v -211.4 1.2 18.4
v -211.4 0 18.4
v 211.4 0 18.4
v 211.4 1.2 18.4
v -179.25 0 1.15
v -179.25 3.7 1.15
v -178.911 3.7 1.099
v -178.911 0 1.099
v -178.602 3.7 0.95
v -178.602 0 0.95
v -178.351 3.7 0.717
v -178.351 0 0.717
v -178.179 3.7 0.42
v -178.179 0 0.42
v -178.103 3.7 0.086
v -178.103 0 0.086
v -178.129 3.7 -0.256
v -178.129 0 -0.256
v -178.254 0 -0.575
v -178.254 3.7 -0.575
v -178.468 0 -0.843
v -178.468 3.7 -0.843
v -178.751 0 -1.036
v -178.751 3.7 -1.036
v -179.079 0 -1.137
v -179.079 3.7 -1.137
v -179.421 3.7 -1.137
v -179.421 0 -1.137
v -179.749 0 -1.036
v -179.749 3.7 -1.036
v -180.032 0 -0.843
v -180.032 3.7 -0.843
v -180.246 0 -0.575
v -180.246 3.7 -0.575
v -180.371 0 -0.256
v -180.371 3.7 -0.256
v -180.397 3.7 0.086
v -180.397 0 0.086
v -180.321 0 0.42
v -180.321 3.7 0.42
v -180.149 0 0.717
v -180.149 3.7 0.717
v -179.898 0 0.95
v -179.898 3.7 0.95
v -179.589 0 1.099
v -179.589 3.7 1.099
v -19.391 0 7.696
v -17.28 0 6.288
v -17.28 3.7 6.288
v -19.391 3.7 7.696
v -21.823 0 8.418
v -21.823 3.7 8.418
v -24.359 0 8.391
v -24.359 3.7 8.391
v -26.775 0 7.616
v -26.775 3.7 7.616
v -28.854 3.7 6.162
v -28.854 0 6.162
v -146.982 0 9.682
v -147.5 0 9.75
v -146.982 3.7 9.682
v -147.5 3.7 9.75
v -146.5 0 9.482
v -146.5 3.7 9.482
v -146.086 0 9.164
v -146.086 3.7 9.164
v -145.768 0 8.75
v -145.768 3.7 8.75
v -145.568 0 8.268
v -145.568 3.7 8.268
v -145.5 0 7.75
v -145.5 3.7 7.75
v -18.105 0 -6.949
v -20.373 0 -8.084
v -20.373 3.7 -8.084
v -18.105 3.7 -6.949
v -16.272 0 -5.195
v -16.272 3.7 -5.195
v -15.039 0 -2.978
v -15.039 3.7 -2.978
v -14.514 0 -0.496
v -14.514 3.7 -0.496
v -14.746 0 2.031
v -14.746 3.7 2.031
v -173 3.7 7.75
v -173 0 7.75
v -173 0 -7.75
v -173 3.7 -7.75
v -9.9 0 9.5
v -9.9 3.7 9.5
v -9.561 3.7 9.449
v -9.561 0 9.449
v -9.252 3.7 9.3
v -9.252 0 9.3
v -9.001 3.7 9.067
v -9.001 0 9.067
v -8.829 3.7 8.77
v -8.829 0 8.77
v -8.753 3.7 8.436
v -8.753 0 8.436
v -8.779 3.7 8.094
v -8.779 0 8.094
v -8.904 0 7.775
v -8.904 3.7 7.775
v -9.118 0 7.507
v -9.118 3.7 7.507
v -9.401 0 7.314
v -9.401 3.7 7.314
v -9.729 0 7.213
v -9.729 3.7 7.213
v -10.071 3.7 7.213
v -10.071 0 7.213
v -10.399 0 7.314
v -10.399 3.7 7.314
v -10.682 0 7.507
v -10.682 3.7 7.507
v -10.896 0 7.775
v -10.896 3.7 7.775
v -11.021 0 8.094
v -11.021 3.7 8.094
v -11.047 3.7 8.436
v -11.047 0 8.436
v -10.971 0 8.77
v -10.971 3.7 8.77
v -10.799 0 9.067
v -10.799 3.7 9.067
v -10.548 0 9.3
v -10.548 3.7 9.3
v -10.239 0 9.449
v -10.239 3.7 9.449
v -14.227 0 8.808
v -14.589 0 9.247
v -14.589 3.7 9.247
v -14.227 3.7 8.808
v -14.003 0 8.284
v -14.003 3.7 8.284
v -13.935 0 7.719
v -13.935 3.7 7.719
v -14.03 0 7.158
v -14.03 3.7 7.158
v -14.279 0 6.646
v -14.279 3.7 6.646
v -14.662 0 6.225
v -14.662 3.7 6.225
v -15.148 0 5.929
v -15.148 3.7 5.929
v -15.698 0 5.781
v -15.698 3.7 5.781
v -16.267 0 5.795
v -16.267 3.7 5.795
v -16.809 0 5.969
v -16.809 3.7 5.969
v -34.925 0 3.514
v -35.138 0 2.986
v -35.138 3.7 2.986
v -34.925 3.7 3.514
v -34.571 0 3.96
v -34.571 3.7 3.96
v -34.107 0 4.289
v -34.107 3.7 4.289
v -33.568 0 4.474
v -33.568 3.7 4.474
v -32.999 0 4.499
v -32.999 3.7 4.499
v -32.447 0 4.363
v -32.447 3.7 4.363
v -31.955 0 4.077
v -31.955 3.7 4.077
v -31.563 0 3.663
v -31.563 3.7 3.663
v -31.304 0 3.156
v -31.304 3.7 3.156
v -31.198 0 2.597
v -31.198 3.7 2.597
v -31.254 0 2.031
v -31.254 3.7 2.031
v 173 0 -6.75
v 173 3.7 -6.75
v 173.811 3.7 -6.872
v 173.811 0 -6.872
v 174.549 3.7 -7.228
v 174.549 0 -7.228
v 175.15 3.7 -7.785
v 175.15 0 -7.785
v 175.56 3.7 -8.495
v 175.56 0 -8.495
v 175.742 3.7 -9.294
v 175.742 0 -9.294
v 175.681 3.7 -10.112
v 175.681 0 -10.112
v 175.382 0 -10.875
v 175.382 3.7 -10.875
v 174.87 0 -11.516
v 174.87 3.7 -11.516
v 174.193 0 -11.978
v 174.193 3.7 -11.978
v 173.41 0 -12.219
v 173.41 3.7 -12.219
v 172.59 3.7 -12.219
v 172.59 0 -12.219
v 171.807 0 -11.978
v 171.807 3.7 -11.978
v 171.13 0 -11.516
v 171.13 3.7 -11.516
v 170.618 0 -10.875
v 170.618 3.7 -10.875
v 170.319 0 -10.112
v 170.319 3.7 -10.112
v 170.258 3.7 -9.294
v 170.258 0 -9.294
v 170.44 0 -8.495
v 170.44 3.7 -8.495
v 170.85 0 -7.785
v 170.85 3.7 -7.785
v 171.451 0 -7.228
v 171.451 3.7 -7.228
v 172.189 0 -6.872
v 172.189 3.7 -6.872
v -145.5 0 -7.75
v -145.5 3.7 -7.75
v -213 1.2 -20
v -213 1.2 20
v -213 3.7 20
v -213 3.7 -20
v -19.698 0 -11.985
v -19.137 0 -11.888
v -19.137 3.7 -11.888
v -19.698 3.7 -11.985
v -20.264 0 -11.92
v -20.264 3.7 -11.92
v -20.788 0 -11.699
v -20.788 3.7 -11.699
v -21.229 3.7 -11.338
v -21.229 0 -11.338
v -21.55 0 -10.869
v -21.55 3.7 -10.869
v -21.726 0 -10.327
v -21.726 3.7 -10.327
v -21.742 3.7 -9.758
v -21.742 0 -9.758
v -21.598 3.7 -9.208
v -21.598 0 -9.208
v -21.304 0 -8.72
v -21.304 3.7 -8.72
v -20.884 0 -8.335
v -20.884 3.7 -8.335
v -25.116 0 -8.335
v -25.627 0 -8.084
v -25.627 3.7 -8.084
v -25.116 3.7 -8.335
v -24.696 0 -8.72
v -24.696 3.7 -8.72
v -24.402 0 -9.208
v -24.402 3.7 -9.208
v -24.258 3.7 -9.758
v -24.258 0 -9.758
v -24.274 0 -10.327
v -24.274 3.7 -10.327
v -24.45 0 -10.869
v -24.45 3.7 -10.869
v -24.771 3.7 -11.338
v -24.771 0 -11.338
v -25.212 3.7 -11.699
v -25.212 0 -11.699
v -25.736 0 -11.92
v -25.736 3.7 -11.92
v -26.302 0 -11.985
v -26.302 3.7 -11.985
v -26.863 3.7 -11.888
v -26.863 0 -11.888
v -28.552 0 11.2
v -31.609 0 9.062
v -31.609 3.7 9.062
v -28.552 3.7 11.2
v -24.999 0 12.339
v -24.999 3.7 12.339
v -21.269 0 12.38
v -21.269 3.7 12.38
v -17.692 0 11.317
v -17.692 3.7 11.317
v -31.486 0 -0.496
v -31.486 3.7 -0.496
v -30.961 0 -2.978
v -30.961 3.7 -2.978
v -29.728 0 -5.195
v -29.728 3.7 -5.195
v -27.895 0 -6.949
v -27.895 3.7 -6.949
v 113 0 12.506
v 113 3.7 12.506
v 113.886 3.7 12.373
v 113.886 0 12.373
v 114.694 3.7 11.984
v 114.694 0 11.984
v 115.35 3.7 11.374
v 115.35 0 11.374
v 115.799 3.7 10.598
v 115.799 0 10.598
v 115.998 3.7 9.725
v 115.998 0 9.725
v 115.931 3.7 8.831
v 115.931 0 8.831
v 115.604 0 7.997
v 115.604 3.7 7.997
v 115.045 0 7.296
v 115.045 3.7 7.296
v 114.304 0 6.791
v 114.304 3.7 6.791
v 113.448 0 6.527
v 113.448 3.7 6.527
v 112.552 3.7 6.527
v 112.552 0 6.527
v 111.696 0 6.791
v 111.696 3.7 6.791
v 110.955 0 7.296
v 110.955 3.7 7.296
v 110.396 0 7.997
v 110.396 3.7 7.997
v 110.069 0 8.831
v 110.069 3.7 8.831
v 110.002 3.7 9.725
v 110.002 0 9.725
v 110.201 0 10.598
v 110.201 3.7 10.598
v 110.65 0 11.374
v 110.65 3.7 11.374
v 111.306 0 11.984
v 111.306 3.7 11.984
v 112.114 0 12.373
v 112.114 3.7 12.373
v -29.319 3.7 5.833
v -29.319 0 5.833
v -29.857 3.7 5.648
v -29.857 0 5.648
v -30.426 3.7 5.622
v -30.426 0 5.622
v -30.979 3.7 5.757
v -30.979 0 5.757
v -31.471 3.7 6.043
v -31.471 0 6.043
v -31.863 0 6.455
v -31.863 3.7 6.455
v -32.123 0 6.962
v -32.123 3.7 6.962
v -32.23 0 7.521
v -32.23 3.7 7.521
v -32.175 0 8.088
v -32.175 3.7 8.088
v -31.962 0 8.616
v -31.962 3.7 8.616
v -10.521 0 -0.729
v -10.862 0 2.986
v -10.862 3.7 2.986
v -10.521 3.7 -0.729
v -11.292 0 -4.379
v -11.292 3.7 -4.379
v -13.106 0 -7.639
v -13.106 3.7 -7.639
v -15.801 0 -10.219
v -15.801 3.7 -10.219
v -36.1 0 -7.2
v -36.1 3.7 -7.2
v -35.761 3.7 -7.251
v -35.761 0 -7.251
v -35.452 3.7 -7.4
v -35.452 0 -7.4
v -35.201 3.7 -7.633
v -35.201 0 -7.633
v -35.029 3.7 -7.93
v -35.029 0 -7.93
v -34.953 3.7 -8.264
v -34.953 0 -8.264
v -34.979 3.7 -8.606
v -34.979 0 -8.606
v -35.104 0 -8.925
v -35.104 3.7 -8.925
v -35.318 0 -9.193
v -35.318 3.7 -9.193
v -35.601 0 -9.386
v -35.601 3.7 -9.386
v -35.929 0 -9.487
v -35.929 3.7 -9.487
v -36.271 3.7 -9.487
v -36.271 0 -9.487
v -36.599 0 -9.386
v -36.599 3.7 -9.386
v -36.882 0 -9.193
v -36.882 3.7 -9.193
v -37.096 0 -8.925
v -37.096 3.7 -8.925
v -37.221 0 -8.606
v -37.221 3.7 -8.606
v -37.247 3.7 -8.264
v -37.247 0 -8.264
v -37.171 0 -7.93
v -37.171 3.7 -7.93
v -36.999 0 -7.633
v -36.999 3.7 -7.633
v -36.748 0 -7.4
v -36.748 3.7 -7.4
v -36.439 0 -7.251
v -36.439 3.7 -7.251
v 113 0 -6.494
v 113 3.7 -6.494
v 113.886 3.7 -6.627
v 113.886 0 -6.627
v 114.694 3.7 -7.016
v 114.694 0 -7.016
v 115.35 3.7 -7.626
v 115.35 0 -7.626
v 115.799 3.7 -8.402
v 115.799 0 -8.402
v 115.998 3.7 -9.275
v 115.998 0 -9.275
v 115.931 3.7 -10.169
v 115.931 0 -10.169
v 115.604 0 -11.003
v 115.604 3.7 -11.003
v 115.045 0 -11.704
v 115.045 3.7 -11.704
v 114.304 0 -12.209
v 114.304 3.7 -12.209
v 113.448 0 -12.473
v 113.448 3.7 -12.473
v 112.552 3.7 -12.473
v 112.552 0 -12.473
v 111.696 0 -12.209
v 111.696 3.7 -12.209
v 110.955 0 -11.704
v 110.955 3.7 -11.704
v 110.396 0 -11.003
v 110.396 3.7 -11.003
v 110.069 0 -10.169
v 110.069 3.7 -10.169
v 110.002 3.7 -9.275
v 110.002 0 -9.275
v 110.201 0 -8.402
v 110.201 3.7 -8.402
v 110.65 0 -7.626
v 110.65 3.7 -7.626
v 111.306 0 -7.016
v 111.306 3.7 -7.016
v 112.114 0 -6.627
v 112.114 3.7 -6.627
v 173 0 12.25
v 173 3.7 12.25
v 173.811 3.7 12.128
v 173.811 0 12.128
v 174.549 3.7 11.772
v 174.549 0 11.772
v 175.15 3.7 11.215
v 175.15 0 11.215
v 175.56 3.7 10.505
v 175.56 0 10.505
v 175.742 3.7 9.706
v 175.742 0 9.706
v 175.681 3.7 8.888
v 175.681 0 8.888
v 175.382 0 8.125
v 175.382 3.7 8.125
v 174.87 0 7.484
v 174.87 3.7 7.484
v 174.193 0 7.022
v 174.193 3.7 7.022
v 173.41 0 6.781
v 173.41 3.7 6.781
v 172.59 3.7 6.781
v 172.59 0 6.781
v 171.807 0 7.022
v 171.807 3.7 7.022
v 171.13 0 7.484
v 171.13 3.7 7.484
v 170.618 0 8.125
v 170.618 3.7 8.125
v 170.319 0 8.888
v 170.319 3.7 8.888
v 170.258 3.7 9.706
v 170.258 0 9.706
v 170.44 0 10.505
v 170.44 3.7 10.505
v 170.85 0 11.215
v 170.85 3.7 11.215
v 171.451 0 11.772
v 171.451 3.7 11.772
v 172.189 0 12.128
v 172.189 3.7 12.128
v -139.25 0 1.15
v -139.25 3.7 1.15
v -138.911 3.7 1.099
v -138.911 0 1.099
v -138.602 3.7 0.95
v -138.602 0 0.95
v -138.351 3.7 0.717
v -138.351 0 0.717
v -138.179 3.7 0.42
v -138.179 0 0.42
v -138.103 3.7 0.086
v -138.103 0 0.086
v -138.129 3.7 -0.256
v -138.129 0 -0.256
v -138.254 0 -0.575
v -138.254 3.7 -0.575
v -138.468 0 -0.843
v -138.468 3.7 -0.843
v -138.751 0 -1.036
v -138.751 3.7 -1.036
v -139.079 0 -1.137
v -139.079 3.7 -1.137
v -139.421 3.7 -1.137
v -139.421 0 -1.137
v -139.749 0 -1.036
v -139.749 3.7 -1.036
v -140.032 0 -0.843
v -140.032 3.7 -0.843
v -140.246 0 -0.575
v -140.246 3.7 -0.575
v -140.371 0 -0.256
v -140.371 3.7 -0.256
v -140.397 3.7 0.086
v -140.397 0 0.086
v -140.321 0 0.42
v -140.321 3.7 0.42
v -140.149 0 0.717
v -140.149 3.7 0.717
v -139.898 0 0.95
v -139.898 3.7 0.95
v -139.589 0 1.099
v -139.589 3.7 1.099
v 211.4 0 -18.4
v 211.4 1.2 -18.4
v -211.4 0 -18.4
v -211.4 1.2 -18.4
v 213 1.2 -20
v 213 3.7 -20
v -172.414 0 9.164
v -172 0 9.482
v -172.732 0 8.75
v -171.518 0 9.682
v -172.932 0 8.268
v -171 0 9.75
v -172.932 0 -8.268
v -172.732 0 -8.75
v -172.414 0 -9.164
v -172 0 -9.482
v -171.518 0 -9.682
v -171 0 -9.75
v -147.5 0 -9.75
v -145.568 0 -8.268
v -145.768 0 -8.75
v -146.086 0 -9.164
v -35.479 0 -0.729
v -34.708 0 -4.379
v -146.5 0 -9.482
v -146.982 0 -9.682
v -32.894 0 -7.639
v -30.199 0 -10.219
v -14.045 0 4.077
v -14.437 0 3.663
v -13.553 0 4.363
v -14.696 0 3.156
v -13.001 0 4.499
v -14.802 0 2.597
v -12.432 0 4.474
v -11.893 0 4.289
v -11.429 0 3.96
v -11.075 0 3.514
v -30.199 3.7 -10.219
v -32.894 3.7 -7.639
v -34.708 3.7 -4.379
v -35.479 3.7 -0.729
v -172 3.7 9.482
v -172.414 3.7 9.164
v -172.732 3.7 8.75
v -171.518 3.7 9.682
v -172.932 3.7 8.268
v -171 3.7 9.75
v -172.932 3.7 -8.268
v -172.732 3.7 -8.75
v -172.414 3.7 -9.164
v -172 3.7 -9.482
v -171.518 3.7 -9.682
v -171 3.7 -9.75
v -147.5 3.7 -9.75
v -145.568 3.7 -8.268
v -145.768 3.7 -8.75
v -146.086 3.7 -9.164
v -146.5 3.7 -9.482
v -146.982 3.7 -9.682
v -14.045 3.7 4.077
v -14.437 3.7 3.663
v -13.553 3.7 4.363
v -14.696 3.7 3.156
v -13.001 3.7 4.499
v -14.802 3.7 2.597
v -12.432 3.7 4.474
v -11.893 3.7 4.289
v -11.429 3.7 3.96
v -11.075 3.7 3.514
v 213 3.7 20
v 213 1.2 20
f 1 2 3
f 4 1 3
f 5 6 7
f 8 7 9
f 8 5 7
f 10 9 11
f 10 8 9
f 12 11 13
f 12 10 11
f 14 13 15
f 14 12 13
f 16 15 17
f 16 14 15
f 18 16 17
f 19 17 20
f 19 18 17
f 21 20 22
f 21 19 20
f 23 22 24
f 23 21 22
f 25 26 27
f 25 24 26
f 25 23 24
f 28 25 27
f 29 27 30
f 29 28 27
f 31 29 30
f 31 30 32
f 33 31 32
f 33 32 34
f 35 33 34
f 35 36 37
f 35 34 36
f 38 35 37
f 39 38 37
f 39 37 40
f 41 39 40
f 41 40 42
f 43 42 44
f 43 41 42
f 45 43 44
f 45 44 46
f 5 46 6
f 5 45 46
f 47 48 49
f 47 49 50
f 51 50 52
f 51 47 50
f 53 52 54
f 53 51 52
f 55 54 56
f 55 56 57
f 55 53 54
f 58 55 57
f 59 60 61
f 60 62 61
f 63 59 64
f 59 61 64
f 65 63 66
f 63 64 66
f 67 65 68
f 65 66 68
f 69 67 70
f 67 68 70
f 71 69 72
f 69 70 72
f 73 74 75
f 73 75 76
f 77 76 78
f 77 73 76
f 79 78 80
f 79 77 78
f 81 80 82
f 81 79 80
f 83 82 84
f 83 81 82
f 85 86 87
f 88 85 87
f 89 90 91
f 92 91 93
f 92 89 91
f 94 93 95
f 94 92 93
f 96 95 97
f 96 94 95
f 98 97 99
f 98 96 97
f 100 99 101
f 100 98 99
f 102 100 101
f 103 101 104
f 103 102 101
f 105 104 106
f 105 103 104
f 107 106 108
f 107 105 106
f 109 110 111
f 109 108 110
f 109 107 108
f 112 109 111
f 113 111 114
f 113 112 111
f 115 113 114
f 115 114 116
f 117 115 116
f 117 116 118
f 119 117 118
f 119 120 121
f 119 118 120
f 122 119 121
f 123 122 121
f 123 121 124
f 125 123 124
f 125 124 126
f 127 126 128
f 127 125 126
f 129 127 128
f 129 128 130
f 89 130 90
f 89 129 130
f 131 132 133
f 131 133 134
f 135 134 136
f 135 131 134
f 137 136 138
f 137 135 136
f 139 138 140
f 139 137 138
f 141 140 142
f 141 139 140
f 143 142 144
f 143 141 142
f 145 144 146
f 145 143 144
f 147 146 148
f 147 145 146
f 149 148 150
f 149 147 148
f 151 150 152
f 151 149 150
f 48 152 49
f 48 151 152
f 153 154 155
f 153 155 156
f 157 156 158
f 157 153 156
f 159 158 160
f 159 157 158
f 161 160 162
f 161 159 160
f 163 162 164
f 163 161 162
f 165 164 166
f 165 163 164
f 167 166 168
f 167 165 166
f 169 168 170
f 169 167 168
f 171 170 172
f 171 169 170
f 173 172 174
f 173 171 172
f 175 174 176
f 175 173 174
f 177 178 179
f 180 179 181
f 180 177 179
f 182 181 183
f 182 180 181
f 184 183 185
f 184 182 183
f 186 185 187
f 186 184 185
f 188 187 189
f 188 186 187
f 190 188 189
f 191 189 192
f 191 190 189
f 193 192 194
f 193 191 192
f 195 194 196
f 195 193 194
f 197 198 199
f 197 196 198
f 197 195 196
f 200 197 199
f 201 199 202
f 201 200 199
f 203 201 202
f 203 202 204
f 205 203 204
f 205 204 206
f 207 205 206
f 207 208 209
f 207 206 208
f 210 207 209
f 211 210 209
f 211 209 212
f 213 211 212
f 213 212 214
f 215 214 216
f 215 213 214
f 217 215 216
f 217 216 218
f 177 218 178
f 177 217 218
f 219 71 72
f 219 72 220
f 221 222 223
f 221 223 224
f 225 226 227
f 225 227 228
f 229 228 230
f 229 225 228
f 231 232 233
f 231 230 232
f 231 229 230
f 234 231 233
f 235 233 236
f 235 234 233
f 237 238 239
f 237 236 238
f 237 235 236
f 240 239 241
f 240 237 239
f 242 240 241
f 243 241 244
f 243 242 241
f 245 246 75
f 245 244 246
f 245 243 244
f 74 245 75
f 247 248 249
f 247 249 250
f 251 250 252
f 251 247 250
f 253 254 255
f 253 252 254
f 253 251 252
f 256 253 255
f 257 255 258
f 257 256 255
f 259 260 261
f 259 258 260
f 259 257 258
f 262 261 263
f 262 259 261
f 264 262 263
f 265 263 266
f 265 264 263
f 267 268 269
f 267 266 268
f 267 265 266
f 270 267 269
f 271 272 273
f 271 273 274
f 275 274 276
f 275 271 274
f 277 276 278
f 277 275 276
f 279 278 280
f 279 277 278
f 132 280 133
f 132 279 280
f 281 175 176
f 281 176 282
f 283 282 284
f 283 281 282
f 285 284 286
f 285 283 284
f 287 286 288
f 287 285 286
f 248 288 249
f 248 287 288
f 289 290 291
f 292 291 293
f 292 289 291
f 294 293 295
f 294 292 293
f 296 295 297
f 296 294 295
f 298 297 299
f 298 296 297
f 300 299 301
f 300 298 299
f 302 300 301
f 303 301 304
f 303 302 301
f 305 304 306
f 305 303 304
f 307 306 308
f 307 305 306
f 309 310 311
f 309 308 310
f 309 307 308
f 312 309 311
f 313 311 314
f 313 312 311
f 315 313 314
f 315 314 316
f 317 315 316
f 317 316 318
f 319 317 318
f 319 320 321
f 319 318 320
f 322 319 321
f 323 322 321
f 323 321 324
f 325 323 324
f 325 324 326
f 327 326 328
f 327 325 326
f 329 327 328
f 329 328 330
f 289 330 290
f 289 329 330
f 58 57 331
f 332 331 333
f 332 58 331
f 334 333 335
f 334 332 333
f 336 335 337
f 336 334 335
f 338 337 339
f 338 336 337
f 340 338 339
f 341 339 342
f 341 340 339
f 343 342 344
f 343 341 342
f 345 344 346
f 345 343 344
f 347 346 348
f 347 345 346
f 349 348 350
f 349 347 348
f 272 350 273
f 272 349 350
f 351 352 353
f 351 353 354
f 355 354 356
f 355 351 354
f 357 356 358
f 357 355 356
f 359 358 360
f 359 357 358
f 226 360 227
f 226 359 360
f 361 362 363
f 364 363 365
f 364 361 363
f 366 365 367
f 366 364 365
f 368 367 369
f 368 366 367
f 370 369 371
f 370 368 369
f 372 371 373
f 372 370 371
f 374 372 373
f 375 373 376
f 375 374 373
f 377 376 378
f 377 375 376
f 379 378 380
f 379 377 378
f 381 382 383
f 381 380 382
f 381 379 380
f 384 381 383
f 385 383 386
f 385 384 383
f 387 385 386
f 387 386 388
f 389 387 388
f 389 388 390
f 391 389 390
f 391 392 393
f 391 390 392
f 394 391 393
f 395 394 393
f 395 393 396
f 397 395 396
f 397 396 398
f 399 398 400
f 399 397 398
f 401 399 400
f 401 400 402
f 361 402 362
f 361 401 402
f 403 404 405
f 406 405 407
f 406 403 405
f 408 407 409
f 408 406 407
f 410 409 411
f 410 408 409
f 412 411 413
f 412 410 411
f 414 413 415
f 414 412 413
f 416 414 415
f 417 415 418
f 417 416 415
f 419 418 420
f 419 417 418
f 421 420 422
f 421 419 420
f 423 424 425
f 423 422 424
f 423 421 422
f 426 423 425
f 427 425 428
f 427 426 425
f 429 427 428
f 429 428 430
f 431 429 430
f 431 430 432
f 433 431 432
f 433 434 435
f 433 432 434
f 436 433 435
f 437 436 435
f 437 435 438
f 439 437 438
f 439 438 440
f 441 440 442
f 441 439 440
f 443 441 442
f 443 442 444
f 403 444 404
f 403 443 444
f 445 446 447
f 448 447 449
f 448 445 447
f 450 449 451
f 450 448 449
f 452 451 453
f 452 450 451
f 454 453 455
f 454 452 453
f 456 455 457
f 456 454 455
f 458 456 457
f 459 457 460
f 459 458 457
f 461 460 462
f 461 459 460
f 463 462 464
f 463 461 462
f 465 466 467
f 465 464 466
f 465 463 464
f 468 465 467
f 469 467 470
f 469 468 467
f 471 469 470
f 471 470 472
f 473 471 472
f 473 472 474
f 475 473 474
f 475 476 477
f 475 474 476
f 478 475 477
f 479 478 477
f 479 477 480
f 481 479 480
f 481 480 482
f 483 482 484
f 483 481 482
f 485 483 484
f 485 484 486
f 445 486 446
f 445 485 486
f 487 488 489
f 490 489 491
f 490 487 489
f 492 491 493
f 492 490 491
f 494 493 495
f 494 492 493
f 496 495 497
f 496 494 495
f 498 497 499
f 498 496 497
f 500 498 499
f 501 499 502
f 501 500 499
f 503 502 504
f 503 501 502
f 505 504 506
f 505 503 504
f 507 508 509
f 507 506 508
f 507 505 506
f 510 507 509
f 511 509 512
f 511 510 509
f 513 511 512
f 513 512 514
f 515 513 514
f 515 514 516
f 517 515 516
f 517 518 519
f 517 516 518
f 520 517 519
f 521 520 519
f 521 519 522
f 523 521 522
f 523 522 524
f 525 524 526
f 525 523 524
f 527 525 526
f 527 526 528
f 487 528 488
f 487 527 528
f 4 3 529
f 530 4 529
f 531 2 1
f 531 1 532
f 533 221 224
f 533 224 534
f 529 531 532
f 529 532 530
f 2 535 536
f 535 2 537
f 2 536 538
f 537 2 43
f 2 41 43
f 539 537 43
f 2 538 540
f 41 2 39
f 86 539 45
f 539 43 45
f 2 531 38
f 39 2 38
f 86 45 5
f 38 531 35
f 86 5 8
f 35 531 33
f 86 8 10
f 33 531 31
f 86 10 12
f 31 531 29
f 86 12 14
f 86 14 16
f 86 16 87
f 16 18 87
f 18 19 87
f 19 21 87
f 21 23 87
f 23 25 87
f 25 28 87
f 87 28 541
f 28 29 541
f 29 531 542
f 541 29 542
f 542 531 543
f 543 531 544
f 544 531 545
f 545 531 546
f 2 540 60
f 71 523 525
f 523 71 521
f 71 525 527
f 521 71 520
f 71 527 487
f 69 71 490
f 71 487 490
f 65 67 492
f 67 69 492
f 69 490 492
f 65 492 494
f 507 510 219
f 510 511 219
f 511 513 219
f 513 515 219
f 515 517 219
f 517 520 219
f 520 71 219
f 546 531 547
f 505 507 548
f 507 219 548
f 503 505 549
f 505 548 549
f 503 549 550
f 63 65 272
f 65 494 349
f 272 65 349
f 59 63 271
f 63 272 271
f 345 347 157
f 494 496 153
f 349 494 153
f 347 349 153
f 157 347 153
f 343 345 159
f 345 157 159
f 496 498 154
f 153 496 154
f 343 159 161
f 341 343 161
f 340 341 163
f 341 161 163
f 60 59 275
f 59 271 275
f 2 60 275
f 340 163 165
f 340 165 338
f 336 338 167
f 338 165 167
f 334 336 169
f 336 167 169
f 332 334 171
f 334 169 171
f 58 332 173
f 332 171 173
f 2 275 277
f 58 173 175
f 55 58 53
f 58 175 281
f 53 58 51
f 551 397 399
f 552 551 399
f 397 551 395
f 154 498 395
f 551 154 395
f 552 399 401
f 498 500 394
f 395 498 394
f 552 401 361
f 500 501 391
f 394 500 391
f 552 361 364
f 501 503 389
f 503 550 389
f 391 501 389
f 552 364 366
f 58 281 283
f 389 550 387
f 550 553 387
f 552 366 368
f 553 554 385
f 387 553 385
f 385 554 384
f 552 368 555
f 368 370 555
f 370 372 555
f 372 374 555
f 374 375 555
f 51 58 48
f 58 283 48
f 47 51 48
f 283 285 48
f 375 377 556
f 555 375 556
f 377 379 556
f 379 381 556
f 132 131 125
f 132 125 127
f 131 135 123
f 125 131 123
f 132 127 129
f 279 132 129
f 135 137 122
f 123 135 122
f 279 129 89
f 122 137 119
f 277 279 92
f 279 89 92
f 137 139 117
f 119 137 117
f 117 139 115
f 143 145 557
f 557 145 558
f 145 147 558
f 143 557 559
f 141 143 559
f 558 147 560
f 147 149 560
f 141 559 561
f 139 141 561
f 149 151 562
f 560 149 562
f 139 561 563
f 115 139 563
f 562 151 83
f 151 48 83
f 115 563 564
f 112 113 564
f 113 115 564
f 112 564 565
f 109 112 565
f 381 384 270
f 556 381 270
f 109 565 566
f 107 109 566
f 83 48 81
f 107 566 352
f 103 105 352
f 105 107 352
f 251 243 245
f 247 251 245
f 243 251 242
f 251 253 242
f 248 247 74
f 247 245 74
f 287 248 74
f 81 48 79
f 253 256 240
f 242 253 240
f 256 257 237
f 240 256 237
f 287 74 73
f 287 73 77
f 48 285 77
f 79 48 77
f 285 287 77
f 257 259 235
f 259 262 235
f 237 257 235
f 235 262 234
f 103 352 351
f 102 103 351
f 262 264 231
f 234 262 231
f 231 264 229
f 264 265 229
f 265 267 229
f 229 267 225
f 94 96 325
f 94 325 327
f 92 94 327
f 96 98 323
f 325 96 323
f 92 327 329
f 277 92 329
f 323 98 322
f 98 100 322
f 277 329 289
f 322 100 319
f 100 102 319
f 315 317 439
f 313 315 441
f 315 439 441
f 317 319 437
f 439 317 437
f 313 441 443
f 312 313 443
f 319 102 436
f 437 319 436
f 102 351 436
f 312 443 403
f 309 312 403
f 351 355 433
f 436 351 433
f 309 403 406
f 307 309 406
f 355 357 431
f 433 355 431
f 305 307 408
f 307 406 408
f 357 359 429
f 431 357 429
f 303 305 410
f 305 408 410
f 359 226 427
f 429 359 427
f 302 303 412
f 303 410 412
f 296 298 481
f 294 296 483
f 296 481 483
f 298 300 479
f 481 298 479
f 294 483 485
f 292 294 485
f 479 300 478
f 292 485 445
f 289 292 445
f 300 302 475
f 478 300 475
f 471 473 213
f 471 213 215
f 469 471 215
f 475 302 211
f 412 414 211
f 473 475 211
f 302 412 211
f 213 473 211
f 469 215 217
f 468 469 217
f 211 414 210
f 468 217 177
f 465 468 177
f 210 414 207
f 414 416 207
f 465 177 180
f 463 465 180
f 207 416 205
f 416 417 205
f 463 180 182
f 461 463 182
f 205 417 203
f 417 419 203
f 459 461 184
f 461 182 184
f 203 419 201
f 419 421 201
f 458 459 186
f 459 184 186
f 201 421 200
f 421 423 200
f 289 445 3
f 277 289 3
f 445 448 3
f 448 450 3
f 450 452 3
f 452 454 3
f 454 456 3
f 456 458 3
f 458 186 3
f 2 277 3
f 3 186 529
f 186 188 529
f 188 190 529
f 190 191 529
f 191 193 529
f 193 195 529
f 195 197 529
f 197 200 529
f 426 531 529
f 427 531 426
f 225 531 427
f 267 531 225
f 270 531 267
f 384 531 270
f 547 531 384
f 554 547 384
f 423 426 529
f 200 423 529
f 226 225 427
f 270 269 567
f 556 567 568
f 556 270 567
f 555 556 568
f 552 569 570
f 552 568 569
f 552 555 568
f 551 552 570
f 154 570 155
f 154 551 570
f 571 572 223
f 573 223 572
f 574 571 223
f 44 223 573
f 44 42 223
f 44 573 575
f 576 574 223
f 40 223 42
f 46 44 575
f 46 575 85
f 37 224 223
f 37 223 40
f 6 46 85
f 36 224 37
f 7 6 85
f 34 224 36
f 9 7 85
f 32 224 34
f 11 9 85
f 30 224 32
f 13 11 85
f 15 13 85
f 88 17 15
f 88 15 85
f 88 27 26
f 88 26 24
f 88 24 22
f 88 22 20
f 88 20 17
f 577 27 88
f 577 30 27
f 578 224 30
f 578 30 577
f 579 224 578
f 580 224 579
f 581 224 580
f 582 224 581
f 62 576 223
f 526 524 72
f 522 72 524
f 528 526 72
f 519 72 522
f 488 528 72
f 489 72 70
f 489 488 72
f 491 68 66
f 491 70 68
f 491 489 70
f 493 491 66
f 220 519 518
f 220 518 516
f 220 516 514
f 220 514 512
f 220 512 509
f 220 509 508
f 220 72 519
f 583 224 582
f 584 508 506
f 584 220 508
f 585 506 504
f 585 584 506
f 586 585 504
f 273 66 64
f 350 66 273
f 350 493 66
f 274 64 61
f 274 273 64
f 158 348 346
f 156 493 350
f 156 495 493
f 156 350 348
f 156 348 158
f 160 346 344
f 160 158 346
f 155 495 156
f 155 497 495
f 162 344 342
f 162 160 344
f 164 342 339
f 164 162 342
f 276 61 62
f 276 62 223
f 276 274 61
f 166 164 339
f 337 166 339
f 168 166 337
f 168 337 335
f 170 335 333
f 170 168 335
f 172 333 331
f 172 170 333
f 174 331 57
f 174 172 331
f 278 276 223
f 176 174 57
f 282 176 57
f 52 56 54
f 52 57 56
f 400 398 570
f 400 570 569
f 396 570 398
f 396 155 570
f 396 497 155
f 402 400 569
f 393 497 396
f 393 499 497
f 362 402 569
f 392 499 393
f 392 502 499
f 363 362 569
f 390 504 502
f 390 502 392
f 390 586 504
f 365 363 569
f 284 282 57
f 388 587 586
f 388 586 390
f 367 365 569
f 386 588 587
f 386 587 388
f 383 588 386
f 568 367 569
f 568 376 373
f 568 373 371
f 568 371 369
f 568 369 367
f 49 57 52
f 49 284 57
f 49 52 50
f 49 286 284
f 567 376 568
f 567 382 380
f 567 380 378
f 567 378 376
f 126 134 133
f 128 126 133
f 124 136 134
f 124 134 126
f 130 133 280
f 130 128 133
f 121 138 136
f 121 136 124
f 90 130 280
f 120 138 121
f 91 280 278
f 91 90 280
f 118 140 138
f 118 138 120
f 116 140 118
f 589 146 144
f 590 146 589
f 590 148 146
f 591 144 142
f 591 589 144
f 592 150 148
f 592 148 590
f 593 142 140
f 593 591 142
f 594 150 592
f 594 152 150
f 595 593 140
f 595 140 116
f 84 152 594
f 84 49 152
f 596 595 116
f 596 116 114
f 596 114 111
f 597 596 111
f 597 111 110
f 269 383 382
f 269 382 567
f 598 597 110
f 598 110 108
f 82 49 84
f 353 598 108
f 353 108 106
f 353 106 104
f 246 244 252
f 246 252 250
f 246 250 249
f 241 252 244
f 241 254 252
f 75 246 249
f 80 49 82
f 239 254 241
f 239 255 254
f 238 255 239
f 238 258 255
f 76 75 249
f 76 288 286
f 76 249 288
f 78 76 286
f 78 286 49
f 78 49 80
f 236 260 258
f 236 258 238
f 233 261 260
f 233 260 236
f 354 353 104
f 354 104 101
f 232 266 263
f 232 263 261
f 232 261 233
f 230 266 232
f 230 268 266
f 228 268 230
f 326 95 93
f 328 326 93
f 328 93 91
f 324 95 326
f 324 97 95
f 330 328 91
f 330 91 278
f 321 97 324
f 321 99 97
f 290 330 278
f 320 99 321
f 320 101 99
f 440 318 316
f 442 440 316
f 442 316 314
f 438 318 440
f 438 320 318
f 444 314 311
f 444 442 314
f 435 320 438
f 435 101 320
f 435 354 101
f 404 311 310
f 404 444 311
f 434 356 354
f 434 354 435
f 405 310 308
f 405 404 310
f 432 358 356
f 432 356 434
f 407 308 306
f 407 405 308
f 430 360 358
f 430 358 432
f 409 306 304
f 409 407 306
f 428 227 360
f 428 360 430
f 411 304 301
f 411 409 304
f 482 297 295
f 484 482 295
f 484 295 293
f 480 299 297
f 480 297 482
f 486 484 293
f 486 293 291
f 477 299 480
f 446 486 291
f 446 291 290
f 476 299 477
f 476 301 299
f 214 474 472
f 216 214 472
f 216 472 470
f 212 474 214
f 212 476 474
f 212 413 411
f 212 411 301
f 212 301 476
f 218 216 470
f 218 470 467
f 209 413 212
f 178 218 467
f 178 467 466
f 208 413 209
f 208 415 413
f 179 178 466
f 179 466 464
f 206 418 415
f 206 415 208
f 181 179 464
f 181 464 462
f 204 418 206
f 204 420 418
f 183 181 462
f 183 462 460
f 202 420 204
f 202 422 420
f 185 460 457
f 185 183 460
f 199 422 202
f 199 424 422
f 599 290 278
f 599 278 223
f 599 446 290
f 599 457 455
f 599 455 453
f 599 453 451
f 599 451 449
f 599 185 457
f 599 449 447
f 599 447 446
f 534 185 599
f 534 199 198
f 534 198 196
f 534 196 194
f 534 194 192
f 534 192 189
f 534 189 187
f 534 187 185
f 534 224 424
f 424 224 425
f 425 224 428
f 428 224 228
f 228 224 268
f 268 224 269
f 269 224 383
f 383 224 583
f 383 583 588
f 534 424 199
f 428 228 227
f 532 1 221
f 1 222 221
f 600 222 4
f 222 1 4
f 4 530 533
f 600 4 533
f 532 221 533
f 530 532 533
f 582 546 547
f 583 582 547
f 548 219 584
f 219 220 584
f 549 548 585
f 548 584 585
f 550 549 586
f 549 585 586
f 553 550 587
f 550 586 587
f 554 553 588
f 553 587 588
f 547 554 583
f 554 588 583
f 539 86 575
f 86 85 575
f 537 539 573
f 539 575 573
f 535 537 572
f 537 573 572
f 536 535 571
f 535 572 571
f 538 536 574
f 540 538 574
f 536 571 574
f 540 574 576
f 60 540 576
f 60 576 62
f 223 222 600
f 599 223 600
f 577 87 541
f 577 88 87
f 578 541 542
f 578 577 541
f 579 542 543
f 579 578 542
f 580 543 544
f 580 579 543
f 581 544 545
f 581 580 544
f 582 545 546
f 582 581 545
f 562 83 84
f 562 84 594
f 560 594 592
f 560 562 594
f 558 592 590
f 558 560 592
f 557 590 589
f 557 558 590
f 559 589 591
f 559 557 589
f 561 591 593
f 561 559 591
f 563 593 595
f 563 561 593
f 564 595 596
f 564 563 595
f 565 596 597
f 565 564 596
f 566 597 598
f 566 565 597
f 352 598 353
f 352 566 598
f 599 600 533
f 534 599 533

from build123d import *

# Parameters (mm, degrees)
SKETCH_1_W            = 426
SKETCH_1_H            = 40
EXTRUDE_1_DEPTH       = 3.7
SKETCH_1_2_W          = 426
SKETCH_1_2_H          = 40
SKETCH_1_2_W_2        = 422.8
SKETCH_1_2_H_2        = 36.8
CUT_EXTRUDE_1_DEPTH   = 1.2
SKETCH_2_R            = 2.75
SKETCH_2_R_2          = 1.15
SKETCH_2_R_3          = 3.006394209
SKETCH_2_W            = 27.5
SKETCH_2_H            = 19.5
CUT_EXTRUDE_1_2_DEPTH = 6
FILLET_1_R            = 2


with BuildPart() as part:
    # Эскиз1 → Бобышка-Вытянуть1 (new body)
    with BuildSketch(Plane(origin=(0, 0, 0), x_dir=(1, 0, 0), z_dir=(0, 1, 0))):
        Rectangle(SKETCH_1_W, SKETCH_1_H)
    extrude(amount=EXTRUDE_1_DEPTH)

    # Эскиз1<2> → Cut-Extrude 1 (cut)
    with BuildSketch(Plane(origin=(0, 0, 0), x_dir=(1, 0, 0), z_dir=(0, 1, 0))):
        Rectangle(SKETCH_1_2_W, SKETCH_1_2_H)
        Rectangle(SKETCH_1_2_W_2, SKETCH_1_2_H_2, mode=Mode.SUBTRACT)
    extrude(amount=CUT_EXTRUDE_1_DEPTH, mode=Mode.SUBTRACT)

    # Эскиз2 → Cut-Extrude 1 2 (cut)
    with BuildSketch(Plane(origin=(0, 0, 0), x_dir=(1, 0, 0), z_dir=(0, 1, 0))):
        with Locations((173, -9.5)):
            Circle(SKETCH_2_R)
        with Locations((173, 9.5)):
            Circle(SKETCH_2_R)
        with Locations((-179.25, 0)):
            Circle(SKETCH_2_R_2)
        with Locations((-139.25, 0)):
            Circle(SKETCH_2_R_2)
        with Locations((113, 9.5)):
            Circle(SKETCH_2_R_3)
        with Locations((113, -9.5)):
            Circle(SKETCH_2_R_3)
        with Locations((-9.9, -8.35)):
            Circle(SKETCH_2_R_2)
        with Locations((-36.1, 8.35)):
            Circle(SKETCH_2_R_2)
        with Locations((-159.25, 0)):
            Rectangle(SKETCH_2_W, SKETCH_2_H)
        with BuildLine():
            ThreePointArc((-10.861951827, -2.986266323), (-12.07669601, 6.077123492), (-19.13728757, 11.888206454))
            ThreePointArc((-19.13728757, 11.888206454), (-21.657434592, 10.60412741), (-20.373355548, 8.083980389))
            ThreePointArc((-20.373355548, 8.083980389), (-15.572153287, 4.132443975), (-14.746127242, -2.0306611))
            ThreePointArc((-14.746127242, -2.0306611), (-13.281842146, -4.450551419), (-10.861951827, -2.986266323))
        make_face()
        with BuildLine():
            ThreePointArc((-26.86271243, 11.888206454), (-33.92330399, 6.077123492), (-35.138048173, -2.986266323))
            ThreePointArc((-35.138048173, -2.986266323), (-32.718157854, -4.450551419), (-31.253872758, -2.0306611))
            ThreePointArc((-31.253872758, -2.0306611), (-30.427846713, 4.132443975), (-25.626644452, 8.083980389))
            ThreePointArc((-25.626644452, 8.083980389), (-24.342565408, 10.60412741), (-26.86271243, 11.888206454))
        make_face()
        with BuildLine():
            ThreePointArc((-31.609426427, -9.062437674), (-23.135416387, -12.499266475), (-14.588935276, -9.246836768))
            ThreePointArc((-14.588935276, -9.246836768), (-14.455211749, -6.421572529), (-17.280475988, -6.287849002))
            ThreePointArc((-17.280475988, -6.287849002), (-23.092083143, -8.499501203), (-28.854409971, -6.162457618))
            ThreePointArc((-28.854409971, -6.162457618), (-31.681908227, -6.234939418), (-31.609426427, -9.062437674))
        make_face()
    extrude(amount=CUT_EXTRUDE_1_2_DEPTH, mode=Mode.SUBTRACT)

    # Скругление1
    fillet_1_edges = [part.edges().sort_by_distance(p)[0] for p in [
        (-145.5, 1.85, 9.75),
        (-173, 1.85, 9.75),
        (-145.5, 1.85, -9.75),
        (-173, 1.85, -9.75),
    ]]
    fillet(fillet_1_edges, radius=FILLET_1_R)


solid = part.part
